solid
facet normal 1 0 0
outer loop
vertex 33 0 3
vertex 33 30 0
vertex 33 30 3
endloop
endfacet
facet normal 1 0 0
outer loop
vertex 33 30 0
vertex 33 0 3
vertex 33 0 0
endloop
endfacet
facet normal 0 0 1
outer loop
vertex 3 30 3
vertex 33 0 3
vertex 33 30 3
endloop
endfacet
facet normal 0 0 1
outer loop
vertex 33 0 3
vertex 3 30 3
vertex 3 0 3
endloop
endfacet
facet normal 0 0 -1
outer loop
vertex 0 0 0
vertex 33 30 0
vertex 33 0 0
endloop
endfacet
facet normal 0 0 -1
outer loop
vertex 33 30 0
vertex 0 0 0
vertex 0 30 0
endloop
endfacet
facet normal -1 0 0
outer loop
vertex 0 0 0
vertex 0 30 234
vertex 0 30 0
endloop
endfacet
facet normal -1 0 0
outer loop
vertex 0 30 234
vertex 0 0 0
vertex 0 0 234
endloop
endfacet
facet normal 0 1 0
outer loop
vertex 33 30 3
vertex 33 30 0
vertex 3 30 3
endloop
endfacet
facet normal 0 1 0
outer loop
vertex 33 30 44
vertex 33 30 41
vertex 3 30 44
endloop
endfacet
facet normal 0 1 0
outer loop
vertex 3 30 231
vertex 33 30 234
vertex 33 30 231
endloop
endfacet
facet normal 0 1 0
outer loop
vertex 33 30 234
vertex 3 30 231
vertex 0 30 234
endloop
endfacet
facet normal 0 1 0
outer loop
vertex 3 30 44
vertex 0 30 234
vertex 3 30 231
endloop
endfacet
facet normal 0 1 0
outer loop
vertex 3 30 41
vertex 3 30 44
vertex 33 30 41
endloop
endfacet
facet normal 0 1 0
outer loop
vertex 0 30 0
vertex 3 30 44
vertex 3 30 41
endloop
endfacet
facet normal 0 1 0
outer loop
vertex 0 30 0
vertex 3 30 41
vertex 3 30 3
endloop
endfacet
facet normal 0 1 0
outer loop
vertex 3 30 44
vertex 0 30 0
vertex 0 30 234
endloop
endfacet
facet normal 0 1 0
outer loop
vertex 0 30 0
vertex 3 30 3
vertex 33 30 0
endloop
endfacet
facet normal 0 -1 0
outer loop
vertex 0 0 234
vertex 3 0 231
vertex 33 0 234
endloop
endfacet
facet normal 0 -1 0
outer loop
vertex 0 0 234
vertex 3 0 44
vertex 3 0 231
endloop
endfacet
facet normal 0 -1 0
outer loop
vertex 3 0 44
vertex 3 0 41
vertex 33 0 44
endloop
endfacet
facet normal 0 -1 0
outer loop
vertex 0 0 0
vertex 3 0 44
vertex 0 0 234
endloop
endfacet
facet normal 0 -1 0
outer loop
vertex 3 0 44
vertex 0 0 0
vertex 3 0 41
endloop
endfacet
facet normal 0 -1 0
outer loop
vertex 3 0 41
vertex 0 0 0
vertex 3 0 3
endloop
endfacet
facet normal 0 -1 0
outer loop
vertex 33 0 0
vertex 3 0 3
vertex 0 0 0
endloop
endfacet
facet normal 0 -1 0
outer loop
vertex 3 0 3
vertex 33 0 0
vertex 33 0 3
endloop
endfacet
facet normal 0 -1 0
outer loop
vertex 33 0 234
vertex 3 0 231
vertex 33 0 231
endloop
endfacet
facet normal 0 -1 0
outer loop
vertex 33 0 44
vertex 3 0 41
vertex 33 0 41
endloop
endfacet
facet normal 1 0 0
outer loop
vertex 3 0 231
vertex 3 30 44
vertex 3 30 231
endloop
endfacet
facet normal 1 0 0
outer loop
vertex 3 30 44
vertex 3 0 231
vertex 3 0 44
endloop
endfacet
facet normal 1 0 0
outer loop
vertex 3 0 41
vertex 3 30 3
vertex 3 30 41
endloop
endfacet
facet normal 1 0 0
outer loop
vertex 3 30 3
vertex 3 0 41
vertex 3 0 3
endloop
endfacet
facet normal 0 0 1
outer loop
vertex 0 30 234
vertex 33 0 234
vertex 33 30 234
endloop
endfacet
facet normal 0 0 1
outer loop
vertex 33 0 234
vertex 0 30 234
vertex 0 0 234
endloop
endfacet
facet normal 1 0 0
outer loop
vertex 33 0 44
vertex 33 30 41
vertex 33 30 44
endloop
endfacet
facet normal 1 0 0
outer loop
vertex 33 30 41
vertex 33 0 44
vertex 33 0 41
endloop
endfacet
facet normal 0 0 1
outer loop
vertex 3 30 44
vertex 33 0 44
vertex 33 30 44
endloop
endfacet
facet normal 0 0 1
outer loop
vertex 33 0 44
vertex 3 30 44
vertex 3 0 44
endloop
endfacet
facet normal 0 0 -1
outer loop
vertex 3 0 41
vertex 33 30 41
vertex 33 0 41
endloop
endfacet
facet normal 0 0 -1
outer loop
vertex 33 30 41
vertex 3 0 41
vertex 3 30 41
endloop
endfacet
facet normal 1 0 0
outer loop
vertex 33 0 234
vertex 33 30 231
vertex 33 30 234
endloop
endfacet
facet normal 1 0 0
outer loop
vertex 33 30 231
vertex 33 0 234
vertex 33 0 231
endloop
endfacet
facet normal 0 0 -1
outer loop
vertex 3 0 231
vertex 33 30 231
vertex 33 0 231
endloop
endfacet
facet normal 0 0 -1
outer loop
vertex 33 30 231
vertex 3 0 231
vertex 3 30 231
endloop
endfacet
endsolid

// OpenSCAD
// Set variables for dimensions
camera_width = 30;
camera_depth = 30;
table_height = 38;
support_depth = 30;
support_width = 30;
support_thickness_bottom = 3;
support_thickness_top = 3;
camera_platform_thickness = 3;
bracket_height = 190;
bracket_depth = 30;
bracket_thickess = 3;

// Table Bracket
cube ([support_width + bracket_thickess, support_depth, support_thickness_bottom]);
cube ([bracket_thickess, bracket_depth, support_thickness_bottom + table_height + bracket_height + camera_platform_thickness]);

translate ([0, 0, support_thickness_bottom + table_height]) {
    cube ([support_width + bracket_thickess, support_depth, support_thickness_top]);
}

translate ([0,0, support_thickness_bottom + table_height + bracket_height]) {
    cube ([camera_width + bracket_thickess, camera_depth, camera_platform_thickness]);
}
